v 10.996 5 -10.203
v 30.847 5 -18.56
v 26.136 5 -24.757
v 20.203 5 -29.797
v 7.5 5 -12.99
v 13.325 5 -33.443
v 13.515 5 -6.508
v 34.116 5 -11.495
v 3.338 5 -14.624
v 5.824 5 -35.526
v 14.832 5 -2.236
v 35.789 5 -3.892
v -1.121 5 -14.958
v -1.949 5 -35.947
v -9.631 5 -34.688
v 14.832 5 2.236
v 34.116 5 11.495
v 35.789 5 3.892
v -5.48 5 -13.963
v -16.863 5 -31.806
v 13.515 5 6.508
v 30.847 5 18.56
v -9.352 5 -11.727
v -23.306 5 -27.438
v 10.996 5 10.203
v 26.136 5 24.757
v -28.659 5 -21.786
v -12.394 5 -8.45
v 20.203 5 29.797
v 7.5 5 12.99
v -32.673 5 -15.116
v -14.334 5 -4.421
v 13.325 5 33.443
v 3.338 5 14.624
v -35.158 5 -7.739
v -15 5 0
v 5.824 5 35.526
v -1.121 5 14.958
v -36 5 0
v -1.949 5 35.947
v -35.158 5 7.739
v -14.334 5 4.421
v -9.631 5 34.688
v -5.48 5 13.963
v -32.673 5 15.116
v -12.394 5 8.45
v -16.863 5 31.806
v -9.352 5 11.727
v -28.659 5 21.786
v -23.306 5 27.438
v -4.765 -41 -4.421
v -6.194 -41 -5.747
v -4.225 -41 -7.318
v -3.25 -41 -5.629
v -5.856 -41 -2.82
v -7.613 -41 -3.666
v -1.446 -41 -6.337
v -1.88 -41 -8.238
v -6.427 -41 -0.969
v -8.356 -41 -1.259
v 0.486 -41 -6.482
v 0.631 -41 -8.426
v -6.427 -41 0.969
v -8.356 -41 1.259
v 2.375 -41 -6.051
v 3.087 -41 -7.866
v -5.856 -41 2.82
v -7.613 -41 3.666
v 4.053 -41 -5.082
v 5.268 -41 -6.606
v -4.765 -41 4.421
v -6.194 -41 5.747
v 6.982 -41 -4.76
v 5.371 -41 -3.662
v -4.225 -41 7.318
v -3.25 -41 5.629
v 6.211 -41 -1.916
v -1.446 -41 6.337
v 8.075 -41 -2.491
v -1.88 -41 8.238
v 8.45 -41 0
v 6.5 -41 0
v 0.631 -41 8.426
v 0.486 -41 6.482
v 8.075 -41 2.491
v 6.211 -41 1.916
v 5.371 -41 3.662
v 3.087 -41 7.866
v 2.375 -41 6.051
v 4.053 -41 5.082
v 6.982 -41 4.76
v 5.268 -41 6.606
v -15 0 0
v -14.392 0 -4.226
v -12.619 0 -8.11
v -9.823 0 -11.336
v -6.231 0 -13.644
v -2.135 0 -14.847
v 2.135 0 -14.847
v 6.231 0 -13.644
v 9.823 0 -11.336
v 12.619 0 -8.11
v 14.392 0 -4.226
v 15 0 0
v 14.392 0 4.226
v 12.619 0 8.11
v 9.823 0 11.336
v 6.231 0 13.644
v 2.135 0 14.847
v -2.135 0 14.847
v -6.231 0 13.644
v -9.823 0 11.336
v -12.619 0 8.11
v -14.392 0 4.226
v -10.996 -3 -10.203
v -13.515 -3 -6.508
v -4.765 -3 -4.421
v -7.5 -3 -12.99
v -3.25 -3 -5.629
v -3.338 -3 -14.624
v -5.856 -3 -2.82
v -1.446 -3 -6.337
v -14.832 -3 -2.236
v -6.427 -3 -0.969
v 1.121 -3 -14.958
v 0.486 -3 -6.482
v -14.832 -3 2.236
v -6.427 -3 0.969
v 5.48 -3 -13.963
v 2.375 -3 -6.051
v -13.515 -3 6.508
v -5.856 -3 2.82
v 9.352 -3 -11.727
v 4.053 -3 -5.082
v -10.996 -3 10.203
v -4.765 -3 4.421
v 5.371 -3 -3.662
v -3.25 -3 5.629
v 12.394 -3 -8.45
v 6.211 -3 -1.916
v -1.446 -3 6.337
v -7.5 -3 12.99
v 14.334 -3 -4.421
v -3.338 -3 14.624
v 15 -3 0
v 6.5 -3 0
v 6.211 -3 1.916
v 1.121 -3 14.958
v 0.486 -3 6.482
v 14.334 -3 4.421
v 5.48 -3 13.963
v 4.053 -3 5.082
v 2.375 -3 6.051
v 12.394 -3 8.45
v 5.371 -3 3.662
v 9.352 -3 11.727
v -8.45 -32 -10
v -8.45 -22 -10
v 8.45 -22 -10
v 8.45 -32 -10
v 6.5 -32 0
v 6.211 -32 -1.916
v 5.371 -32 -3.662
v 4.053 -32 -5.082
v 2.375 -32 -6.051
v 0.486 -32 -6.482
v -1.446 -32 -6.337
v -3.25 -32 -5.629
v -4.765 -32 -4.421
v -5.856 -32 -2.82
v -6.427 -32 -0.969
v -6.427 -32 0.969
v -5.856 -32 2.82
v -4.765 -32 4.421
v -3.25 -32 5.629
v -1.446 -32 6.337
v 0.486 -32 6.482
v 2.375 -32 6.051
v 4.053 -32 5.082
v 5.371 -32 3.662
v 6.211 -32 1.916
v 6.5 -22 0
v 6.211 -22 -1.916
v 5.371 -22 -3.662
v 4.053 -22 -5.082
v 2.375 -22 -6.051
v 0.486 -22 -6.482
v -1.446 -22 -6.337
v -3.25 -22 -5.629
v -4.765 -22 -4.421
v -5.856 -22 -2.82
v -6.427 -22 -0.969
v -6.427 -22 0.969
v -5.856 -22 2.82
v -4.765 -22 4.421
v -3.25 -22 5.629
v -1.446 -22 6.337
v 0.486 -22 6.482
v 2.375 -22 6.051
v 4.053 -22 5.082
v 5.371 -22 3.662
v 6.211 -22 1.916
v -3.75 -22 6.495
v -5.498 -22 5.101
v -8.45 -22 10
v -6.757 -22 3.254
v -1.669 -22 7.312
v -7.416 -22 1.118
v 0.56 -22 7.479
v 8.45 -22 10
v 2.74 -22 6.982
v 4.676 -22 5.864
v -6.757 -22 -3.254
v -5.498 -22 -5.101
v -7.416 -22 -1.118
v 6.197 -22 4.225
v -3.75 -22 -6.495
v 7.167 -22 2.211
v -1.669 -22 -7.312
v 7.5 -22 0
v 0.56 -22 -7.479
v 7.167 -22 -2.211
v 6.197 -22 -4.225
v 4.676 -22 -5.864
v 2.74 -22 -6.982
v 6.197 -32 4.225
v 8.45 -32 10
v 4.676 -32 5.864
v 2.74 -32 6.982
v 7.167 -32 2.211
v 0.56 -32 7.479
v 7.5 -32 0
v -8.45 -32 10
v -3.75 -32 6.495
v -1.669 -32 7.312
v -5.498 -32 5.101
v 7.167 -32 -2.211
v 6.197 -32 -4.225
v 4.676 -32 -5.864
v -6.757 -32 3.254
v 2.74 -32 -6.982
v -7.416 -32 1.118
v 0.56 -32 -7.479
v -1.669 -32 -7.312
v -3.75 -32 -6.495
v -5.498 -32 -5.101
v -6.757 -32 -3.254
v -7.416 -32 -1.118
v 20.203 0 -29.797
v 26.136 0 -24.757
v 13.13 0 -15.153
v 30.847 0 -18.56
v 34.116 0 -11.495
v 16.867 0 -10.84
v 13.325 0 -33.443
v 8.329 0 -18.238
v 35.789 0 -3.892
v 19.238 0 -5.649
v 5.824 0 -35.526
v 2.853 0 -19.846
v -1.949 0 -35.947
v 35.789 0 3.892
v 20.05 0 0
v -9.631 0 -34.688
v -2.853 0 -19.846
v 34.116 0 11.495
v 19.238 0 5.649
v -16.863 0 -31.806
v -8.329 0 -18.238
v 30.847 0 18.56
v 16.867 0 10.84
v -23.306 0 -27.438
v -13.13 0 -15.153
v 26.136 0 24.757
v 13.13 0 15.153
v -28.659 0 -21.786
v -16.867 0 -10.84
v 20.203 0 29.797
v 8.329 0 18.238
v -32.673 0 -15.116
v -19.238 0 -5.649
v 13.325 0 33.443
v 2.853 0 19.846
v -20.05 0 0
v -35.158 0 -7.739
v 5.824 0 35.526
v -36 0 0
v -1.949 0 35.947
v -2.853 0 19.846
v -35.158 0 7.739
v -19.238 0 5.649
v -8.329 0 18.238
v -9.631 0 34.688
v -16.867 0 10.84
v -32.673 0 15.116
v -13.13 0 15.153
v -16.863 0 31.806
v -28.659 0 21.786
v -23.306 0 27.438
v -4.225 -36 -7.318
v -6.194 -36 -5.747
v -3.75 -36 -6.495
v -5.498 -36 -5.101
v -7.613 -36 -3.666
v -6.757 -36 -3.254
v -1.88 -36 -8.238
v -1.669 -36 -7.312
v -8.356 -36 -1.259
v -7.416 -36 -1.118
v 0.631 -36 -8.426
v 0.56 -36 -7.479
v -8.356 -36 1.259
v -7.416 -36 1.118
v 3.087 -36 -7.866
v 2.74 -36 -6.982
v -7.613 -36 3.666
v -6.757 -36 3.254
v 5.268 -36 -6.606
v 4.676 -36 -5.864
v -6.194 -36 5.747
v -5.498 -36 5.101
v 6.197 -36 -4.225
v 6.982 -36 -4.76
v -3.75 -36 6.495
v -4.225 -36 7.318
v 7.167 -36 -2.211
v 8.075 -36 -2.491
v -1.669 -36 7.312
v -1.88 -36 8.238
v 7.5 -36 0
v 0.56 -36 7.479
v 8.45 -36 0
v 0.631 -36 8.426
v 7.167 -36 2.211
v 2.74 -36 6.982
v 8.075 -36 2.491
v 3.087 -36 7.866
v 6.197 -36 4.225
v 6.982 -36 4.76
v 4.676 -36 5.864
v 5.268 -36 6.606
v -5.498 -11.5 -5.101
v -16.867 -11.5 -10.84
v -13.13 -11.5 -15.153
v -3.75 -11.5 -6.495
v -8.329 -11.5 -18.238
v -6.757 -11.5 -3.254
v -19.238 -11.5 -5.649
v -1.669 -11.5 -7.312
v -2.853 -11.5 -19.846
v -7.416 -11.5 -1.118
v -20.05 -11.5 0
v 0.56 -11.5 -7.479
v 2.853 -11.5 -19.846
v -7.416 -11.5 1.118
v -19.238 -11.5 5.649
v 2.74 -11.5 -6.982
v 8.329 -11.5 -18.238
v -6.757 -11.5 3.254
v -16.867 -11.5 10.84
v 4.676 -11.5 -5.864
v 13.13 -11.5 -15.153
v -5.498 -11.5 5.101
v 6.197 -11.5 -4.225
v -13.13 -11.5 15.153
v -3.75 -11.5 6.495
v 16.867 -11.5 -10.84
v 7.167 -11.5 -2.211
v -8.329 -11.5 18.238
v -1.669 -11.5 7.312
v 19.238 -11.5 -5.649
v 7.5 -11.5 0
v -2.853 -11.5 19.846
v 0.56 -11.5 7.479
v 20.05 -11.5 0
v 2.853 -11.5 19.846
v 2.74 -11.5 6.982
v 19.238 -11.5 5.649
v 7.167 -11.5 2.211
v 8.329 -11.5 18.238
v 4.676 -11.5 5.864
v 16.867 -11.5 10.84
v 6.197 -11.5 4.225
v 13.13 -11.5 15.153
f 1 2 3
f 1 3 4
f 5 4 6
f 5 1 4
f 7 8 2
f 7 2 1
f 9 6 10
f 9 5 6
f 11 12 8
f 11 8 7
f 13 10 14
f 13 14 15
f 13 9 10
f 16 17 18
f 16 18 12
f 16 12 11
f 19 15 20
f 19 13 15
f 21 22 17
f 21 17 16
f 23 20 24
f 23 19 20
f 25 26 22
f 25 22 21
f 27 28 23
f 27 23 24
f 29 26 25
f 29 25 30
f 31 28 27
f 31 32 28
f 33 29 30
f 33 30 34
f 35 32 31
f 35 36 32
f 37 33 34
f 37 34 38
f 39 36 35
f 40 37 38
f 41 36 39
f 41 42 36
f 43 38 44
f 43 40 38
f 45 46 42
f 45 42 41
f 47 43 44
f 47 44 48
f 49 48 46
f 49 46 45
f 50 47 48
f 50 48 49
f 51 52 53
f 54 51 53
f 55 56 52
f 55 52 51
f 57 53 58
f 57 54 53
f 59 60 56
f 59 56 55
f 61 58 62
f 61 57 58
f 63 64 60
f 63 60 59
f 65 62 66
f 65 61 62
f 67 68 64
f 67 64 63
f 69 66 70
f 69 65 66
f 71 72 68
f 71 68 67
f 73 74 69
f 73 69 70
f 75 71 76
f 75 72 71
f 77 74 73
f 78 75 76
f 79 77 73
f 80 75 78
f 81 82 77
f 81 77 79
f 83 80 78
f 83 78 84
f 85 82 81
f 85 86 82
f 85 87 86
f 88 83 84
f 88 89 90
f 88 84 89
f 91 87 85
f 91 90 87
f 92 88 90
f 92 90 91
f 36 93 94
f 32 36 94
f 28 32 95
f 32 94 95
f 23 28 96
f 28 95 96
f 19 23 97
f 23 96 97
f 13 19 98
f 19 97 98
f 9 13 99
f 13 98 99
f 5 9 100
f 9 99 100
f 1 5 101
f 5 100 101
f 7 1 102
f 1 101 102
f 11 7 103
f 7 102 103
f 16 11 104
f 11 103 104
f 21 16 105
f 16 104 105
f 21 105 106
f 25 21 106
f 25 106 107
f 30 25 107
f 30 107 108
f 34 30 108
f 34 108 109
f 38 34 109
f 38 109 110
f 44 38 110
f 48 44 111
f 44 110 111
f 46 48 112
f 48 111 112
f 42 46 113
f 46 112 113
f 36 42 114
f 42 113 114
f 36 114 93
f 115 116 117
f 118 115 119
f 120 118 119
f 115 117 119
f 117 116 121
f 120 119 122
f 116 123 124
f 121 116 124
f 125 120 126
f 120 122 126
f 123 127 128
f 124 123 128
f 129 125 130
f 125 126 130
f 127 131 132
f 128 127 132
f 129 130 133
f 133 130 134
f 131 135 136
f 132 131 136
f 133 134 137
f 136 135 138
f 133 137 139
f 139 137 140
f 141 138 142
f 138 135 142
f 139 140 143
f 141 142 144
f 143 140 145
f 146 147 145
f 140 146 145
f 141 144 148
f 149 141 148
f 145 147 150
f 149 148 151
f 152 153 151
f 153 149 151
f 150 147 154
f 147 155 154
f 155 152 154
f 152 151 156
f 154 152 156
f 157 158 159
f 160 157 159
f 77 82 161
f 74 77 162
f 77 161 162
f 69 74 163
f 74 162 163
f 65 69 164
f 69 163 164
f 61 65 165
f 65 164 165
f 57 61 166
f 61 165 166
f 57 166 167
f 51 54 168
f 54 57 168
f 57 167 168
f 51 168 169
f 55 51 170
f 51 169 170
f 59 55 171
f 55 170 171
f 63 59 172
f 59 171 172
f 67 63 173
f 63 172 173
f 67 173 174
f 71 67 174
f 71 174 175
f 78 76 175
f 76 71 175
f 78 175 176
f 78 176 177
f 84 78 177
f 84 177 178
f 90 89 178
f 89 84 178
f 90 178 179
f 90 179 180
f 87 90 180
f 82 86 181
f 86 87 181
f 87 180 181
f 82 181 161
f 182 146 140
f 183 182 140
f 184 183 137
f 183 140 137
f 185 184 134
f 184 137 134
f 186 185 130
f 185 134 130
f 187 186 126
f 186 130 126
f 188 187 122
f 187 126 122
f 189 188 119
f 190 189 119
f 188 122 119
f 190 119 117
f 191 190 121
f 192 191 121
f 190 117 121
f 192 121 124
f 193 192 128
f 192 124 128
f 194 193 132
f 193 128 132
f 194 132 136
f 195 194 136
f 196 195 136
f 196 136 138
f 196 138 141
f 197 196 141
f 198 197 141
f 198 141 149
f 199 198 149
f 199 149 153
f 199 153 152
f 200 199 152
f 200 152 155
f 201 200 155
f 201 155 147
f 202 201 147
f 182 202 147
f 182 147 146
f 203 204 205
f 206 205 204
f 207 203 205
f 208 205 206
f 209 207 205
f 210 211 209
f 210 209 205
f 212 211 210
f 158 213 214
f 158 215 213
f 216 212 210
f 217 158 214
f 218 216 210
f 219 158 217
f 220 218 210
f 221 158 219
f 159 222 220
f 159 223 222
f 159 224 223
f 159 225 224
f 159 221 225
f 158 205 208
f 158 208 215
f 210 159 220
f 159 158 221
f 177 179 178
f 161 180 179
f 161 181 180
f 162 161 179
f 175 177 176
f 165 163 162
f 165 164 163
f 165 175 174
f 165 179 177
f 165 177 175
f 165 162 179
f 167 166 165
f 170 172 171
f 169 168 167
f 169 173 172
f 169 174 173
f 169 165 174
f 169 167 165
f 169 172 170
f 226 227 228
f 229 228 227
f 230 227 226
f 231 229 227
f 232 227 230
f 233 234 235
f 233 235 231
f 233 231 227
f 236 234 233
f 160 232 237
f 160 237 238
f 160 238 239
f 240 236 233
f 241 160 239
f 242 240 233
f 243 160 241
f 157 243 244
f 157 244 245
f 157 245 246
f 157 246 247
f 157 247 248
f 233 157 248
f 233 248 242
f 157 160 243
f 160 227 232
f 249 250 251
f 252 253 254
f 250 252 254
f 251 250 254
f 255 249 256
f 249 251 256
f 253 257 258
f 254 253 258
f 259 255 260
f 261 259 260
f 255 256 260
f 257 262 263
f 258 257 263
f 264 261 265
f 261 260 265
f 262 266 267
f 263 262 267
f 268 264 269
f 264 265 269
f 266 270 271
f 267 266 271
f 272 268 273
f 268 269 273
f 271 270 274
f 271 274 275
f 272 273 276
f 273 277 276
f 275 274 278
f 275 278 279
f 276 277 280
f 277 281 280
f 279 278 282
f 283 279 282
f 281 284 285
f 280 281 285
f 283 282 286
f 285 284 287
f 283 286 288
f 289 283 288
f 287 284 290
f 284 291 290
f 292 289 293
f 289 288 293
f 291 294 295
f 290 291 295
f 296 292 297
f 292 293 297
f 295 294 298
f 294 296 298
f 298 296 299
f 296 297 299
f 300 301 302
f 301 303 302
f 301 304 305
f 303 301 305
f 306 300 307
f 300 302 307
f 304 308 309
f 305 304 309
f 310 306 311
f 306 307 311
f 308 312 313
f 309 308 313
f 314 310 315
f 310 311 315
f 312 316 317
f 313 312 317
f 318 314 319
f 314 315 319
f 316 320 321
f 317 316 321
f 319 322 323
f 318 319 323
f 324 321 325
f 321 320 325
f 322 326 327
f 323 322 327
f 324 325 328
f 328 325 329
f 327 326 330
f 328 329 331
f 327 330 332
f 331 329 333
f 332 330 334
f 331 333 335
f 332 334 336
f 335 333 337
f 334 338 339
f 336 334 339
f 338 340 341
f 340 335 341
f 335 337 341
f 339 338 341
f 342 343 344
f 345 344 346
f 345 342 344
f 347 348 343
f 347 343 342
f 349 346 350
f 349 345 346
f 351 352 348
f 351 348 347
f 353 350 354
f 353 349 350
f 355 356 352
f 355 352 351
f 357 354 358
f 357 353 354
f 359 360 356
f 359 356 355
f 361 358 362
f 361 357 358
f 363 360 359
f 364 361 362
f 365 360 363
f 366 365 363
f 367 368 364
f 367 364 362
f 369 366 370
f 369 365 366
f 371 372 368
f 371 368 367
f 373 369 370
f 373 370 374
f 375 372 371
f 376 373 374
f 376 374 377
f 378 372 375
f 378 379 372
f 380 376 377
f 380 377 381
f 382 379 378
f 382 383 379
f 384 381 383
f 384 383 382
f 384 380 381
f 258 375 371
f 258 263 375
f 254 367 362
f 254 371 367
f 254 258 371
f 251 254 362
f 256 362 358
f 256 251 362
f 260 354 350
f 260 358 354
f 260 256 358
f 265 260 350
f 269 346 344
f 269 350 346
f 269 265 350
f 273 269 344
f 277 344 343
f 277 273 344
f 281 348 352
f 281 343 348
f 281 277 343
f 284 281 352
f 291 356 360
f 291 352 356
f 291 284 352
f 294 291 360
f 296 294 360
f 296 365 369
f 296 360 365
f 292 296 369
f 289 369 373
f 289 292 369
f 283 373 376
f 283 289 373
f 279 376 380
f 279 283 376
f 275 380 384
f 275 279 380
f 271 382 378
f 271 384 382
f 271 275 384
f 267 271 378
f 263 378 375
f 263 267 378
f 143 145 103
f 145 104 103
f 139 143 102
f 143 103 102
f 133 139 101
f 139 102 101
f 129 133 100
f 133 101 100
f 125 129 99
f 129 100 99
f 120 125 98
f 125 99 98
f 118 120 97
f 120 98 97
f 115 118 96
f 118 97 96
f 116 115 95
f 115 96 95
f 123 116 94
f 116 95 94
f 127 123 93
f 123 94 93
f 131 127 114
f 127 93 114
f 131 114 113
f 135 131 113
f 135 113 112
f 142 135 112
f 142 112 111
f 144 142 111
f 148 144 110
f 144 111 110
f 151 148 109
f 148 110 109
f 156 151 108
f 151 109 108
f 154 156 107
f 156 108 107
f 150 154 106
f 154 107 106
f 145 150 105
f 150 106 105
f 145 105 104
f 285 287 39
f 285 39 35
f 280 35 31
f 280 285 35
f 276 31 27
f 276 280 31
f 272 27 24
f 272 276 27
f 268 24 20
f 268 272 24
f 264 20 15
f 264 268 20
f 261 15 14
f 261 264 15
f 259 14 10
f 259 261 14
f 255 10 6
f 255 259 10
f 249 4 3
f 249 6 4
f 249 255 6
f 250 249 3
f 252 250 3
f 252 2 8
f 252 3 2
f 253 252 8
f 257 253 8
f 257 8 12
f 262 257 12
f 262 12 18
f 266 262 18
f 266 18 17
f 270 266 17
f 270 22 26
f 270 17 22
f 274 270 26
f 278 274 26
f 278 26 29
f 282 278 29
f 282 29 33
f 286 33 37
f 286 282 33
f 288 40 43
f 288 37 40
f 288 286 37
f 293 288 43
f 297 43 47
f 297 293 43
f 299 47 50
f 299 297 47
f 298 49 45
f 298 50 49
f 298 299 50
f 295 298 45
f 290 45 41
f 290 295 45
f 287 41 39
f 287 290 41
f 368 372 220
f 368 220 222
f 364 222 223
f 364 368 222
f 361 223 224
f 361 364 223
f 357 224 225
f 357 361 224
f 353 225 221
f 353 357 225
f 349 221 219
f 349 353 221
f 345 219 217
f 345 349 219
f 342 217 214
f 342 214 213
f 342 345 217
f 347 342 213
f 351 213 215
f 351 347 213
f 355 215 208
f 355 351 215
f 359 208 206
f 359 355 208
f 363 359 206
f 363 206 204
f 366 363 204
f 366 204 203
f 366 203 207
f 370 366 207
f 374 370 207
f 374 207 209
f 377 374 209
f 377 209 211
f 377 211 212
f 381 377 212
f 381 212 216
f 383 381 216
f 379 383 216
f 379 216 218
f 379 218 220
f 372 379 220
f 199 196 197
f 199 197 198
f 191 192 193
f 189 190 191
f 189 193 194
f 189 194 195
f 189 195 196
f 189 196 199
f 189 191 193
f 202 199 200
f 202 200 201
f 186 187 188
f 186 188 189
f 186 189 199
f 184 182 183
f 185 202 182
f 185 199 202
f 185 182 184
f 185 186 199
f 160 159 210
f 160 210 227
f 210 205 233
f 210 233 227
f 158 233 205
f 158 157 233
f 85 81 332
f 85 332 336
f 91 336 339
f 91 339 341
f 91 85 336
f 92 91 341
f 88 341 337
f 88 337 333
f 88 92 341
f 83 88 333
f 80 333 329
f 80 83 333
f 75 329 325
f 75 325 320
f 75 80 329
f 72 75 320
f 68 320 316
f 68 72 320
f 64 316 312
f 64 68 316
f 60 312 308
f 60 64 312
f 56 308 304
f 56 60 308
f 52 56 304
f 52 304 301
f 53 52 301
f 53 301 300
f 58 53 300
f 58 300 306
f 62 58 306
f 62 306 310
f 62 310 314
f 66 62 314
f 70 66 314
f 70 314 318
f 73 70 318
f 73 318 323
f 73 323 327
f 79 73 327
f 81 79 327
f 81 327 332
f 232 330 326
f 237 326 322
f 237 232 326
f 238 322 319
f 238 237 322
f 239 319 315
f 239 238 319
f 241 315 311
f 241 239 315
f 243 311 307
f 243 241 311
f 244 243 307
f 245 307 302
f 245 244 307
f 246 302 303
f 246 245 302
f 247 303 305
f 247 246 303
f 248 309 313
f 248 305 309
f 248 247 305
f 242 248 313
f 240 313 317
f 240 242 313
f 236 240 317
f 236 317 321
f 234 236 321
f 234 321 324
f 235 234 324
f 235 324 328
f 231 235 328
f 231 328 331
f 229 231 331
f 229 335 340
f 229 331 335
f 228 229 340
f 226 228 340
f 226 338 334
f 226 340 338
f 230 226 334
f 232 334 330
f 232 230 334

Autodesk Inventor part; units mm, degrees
ref_plane "YZ Plane" through (0, 0, 0) normal (1, 0, 0) x (0, 1, 0)
ref_plane "XZ Plane" through (0, 0, 0) normal (0, 1, 0) x (-1, 0, 0)
ref_plane "XY Plane" through (0, 0, 0) normal (0, 0, 1) x (1, 0, 0)
sketch "Sketch1" plane through (0, 0, 0) normal (0, 1, 0) x (-1, 0, 0)
  circle A0 centre (0, 0) radius 36
  circle A1 centre (0, 0) radius 15
  dimension "d0" = 72
  dimension "d1" = 30
extrude "Extrusion1" add sketch "Sketch1" along normal blind 5
sketch "Sketch2" plane through (0, 0, 0) normal (0, -1, 0) x (1, 0, 0)
  circle A0 centre (0, 0) radius 36 projected
  circle A1 centre (0, 0) radius 15 projected
  circle A2 centre (0, 0) radius 20.05
  dimension "d4" = 40.1
extrude "Extrusion2" add sketch "Sketch2" along normal blind 11.5 contours A2
sketch "Sketch3" plane through (0, -11.5, 0) normal (0, -1, 0) x (1, 0, 0)
  circle A0 centre (0, 0) radius 7.5
  circle A1 centre (0, 0) radius 20.05 projected
  circle A2 centre (0, 0) radius 15 projected
  circle A3 centre (0, 0) radius 6.5
  dimension "d7" = 15
  dimension "d8" = 13
extrude "Extrusion3" add sketch "Sketch3" along normal blind 29.5 and the other way blind 8.5 contours A0
extrude "Extrusion4" add sketch "Sketch3" against normal up to surface (8.5 mm away) contours A2
sketch "Sketch4" plane through (0, -41, 0) normal (0, -1, 0) x (1, 0, 0)
  circle A0 centre (0, 0) radius 7.5 projected
  circle A1 centre (0, 0) radius 6.5 projected
  circle A2 centre (0, 0) radius 8.45
  dimension "d15" = 16.9
extrude "Extrusion5" add sketch "Sketch4" against normal blind 5 contours A2
sketch "Sketch5" plane through (0, -36, 0) normal (0, 1, 0) x (1, 0, 0)
  point P0 (0, 0)
sketch "Sketch6" plane through (0, 0, 0) normal (0, 0, 1) x (1, 0, 0)
  line L0 (8.45, -36) -> (-8.45, -36) projected
  line L1 (-8.45, -41) -> (8.45, -41) projected
  line L2 (8.45, -32) -> (-8.45, -32)
  line L3 (-8.45, -32) -> (-8.45, -22)
  line L4 (-8.45, -22) -> (8.45, -22)
  line L5 (8.45, -22) -> (8.45, -32)
  point P0 (0, 0)
  dimension "d18" = 10
  dimension "d21" = 9
extrude "Extrusion6" add sketch "Sketch6" along normal mid plane 20
properties part number "Axis1_bottom"
